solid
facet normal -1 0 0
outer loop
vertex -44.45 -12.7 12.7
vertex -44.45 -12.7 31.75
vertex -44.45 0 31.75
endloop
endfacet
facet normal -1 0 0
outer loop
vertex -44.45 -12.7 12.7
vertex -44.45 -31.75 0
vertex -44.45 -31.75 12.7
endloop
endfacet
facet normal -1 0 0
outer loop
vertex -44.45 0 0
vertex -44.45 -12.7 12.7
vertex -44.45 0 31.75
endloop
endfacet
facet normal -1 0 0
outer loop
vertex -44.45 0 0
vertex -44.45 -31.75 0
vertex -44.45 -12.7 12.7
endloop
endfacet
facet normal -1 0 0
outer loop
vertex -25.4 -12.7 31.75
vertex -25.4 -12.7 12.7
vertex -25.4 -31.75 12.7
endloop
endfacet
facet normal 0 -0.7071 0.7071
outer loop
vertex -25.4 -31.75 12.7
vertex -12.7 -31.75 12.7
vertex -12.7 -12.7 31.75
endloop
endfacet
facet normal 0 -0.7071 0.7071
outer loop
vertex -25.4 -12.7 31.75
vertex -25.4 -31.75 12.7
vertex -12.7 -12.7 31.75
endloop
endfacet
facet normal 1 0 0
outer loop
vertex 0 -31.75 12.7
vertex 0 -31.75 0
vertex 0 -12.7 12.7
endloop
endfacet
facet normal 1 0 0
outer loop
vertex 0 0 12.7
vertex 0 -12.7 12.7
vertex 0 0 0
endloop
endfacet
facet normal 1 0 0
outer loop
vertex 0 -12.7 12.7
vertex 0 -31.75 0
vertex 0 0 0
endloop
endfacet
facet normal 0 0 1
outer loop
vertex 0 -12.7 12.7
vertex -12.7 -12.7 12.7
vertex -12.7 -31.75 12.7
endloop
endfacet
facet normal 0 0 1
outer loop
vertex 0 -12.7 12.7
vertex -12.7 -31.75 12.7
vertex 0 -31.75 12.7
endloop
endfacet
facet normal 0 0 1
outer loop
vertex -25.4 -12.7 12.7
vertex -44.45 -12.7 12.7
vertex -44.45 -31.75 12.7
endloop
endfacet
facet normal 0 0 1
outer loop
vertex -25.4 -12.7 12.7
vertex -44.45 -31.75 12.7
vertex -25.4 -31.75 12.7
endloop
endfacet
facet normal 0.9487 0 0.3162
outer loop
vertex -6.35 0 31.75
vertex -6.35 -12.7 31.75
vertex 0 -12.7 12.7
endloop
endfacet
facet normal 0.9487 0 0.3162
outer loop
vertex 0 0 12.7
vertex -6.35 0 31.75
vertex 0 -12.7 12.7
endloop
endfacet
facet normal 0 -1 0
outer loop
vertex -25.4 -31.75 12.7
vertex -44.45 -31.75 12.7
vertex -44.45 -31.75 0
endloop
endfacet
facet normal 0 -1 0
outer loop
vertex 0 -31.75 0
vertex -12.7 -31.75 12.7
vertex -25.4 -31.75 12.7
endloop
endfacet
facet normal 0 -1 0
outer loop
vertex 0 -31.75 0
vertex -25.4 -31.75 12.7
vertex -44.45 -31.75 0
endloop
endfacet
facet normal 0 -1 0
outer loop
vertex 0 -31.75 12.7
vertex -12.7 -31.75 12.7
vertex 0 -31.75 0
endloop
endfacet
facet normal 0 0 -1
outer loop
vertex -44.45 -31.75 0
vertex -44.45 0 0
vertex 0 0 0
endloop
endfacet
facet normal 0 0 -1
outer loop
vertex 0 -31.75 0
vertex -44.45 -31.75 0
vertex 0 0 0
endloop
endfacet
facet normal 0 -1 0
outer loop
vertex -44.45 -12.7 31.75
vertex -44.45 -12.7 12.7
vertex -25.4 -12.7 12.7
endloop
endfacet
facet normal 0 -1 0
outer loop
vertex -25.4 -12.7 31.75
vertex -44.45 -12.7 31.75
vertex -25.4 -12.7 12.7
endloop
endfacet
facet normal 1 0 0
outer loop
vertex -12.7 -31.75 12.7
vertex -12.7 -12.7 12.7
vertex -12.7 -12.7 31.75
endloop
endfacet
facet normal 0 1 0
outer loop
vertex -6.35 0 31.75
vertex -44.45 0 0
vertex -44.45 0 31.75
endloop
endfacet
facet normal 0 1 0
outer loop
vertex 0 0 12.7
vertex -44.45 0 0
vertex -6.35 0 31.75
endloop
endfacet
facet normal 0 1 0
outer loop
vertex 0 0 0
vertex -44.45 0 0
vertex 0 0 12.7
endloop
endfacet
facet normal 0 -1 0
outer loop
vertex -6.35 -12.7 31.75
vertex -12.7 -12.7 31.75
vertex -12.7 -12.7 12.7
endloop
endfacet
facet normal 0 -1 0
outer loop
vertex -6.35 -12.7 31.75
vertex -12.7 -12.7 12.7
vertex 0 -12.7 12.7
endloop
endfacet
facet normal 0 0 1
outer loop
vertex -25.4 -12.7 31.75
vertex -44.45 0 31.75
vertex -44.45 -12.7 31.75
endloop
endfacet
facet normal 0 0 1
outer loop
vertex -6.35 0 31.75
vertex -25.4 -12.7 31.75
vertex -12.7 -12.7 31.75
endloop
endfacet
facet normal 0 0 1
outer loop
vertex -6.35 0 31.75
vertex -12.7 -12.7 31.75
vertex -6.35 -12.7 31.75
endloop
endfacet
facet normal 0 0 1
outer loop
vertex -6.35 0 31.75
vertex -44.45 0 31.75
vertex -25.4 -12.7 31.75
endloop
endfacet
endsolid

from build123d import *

# Parameters (mm, degrees)
F0_W     = 44.45
F0_H     = 12.7
F1_DEPTH = 31.75
F2_W     = 44.45
F2_H     = 12.7
F3_DEPTH = 19.05
F4_W     = 12.7
F4_H     = 19.05
F5_DEPTH = 19.05
F7_DEPTH = 25.4
F9_DEPTH = 25.4


with BuildPart() as f1:
    # F0 (on Front) → F1 (new body)
    with BuildSketch(Plane.XZ):
        with Locations((-22.225, 6.35)):
            Rectangle(F0_W, F0_H)
    extrude(amount=F1_DEPTH)

    # F2 (on face) → F3 (join)
    with BuildSketch(Plane.XY.offset(12.7)):
        with Locations((-22.225, -6.35)):
            Rectangle(F2_W, F2_H)
    extrude(amount=F3_DEPTH)

    # F4 (on face) → F5 (join)
    with BuildSketch(Plane.XZ.offset(12.7)):
        with Locations((-19.05, 22.225)):
            Rectangle(F4_W, F4_H)
    extrude(amount=F5_DEPTH)

    # F6 (on face) → F7 (cut)
    with BuildSketch(Plane.YZ.offset(-12.7)):
        Polygon((-31.75, 31.75), (-31.75, 12.7), (-12.7, 31.75), align=None)
    extrude(amount=-F7_DEPTH, mode=Mode.SUBTRACT)

    # F8 (on face) → F9 (cut)
    with BuildSketch(Plane.XZ.offset(12.7)):
        Polygon((0, 31.75), (-6.35, 31.75), (0, 12.7), align=None)
    extrude(amount=-F9_DEPTH, mode=Mode.SUBTRACT)


solid = f1.part
